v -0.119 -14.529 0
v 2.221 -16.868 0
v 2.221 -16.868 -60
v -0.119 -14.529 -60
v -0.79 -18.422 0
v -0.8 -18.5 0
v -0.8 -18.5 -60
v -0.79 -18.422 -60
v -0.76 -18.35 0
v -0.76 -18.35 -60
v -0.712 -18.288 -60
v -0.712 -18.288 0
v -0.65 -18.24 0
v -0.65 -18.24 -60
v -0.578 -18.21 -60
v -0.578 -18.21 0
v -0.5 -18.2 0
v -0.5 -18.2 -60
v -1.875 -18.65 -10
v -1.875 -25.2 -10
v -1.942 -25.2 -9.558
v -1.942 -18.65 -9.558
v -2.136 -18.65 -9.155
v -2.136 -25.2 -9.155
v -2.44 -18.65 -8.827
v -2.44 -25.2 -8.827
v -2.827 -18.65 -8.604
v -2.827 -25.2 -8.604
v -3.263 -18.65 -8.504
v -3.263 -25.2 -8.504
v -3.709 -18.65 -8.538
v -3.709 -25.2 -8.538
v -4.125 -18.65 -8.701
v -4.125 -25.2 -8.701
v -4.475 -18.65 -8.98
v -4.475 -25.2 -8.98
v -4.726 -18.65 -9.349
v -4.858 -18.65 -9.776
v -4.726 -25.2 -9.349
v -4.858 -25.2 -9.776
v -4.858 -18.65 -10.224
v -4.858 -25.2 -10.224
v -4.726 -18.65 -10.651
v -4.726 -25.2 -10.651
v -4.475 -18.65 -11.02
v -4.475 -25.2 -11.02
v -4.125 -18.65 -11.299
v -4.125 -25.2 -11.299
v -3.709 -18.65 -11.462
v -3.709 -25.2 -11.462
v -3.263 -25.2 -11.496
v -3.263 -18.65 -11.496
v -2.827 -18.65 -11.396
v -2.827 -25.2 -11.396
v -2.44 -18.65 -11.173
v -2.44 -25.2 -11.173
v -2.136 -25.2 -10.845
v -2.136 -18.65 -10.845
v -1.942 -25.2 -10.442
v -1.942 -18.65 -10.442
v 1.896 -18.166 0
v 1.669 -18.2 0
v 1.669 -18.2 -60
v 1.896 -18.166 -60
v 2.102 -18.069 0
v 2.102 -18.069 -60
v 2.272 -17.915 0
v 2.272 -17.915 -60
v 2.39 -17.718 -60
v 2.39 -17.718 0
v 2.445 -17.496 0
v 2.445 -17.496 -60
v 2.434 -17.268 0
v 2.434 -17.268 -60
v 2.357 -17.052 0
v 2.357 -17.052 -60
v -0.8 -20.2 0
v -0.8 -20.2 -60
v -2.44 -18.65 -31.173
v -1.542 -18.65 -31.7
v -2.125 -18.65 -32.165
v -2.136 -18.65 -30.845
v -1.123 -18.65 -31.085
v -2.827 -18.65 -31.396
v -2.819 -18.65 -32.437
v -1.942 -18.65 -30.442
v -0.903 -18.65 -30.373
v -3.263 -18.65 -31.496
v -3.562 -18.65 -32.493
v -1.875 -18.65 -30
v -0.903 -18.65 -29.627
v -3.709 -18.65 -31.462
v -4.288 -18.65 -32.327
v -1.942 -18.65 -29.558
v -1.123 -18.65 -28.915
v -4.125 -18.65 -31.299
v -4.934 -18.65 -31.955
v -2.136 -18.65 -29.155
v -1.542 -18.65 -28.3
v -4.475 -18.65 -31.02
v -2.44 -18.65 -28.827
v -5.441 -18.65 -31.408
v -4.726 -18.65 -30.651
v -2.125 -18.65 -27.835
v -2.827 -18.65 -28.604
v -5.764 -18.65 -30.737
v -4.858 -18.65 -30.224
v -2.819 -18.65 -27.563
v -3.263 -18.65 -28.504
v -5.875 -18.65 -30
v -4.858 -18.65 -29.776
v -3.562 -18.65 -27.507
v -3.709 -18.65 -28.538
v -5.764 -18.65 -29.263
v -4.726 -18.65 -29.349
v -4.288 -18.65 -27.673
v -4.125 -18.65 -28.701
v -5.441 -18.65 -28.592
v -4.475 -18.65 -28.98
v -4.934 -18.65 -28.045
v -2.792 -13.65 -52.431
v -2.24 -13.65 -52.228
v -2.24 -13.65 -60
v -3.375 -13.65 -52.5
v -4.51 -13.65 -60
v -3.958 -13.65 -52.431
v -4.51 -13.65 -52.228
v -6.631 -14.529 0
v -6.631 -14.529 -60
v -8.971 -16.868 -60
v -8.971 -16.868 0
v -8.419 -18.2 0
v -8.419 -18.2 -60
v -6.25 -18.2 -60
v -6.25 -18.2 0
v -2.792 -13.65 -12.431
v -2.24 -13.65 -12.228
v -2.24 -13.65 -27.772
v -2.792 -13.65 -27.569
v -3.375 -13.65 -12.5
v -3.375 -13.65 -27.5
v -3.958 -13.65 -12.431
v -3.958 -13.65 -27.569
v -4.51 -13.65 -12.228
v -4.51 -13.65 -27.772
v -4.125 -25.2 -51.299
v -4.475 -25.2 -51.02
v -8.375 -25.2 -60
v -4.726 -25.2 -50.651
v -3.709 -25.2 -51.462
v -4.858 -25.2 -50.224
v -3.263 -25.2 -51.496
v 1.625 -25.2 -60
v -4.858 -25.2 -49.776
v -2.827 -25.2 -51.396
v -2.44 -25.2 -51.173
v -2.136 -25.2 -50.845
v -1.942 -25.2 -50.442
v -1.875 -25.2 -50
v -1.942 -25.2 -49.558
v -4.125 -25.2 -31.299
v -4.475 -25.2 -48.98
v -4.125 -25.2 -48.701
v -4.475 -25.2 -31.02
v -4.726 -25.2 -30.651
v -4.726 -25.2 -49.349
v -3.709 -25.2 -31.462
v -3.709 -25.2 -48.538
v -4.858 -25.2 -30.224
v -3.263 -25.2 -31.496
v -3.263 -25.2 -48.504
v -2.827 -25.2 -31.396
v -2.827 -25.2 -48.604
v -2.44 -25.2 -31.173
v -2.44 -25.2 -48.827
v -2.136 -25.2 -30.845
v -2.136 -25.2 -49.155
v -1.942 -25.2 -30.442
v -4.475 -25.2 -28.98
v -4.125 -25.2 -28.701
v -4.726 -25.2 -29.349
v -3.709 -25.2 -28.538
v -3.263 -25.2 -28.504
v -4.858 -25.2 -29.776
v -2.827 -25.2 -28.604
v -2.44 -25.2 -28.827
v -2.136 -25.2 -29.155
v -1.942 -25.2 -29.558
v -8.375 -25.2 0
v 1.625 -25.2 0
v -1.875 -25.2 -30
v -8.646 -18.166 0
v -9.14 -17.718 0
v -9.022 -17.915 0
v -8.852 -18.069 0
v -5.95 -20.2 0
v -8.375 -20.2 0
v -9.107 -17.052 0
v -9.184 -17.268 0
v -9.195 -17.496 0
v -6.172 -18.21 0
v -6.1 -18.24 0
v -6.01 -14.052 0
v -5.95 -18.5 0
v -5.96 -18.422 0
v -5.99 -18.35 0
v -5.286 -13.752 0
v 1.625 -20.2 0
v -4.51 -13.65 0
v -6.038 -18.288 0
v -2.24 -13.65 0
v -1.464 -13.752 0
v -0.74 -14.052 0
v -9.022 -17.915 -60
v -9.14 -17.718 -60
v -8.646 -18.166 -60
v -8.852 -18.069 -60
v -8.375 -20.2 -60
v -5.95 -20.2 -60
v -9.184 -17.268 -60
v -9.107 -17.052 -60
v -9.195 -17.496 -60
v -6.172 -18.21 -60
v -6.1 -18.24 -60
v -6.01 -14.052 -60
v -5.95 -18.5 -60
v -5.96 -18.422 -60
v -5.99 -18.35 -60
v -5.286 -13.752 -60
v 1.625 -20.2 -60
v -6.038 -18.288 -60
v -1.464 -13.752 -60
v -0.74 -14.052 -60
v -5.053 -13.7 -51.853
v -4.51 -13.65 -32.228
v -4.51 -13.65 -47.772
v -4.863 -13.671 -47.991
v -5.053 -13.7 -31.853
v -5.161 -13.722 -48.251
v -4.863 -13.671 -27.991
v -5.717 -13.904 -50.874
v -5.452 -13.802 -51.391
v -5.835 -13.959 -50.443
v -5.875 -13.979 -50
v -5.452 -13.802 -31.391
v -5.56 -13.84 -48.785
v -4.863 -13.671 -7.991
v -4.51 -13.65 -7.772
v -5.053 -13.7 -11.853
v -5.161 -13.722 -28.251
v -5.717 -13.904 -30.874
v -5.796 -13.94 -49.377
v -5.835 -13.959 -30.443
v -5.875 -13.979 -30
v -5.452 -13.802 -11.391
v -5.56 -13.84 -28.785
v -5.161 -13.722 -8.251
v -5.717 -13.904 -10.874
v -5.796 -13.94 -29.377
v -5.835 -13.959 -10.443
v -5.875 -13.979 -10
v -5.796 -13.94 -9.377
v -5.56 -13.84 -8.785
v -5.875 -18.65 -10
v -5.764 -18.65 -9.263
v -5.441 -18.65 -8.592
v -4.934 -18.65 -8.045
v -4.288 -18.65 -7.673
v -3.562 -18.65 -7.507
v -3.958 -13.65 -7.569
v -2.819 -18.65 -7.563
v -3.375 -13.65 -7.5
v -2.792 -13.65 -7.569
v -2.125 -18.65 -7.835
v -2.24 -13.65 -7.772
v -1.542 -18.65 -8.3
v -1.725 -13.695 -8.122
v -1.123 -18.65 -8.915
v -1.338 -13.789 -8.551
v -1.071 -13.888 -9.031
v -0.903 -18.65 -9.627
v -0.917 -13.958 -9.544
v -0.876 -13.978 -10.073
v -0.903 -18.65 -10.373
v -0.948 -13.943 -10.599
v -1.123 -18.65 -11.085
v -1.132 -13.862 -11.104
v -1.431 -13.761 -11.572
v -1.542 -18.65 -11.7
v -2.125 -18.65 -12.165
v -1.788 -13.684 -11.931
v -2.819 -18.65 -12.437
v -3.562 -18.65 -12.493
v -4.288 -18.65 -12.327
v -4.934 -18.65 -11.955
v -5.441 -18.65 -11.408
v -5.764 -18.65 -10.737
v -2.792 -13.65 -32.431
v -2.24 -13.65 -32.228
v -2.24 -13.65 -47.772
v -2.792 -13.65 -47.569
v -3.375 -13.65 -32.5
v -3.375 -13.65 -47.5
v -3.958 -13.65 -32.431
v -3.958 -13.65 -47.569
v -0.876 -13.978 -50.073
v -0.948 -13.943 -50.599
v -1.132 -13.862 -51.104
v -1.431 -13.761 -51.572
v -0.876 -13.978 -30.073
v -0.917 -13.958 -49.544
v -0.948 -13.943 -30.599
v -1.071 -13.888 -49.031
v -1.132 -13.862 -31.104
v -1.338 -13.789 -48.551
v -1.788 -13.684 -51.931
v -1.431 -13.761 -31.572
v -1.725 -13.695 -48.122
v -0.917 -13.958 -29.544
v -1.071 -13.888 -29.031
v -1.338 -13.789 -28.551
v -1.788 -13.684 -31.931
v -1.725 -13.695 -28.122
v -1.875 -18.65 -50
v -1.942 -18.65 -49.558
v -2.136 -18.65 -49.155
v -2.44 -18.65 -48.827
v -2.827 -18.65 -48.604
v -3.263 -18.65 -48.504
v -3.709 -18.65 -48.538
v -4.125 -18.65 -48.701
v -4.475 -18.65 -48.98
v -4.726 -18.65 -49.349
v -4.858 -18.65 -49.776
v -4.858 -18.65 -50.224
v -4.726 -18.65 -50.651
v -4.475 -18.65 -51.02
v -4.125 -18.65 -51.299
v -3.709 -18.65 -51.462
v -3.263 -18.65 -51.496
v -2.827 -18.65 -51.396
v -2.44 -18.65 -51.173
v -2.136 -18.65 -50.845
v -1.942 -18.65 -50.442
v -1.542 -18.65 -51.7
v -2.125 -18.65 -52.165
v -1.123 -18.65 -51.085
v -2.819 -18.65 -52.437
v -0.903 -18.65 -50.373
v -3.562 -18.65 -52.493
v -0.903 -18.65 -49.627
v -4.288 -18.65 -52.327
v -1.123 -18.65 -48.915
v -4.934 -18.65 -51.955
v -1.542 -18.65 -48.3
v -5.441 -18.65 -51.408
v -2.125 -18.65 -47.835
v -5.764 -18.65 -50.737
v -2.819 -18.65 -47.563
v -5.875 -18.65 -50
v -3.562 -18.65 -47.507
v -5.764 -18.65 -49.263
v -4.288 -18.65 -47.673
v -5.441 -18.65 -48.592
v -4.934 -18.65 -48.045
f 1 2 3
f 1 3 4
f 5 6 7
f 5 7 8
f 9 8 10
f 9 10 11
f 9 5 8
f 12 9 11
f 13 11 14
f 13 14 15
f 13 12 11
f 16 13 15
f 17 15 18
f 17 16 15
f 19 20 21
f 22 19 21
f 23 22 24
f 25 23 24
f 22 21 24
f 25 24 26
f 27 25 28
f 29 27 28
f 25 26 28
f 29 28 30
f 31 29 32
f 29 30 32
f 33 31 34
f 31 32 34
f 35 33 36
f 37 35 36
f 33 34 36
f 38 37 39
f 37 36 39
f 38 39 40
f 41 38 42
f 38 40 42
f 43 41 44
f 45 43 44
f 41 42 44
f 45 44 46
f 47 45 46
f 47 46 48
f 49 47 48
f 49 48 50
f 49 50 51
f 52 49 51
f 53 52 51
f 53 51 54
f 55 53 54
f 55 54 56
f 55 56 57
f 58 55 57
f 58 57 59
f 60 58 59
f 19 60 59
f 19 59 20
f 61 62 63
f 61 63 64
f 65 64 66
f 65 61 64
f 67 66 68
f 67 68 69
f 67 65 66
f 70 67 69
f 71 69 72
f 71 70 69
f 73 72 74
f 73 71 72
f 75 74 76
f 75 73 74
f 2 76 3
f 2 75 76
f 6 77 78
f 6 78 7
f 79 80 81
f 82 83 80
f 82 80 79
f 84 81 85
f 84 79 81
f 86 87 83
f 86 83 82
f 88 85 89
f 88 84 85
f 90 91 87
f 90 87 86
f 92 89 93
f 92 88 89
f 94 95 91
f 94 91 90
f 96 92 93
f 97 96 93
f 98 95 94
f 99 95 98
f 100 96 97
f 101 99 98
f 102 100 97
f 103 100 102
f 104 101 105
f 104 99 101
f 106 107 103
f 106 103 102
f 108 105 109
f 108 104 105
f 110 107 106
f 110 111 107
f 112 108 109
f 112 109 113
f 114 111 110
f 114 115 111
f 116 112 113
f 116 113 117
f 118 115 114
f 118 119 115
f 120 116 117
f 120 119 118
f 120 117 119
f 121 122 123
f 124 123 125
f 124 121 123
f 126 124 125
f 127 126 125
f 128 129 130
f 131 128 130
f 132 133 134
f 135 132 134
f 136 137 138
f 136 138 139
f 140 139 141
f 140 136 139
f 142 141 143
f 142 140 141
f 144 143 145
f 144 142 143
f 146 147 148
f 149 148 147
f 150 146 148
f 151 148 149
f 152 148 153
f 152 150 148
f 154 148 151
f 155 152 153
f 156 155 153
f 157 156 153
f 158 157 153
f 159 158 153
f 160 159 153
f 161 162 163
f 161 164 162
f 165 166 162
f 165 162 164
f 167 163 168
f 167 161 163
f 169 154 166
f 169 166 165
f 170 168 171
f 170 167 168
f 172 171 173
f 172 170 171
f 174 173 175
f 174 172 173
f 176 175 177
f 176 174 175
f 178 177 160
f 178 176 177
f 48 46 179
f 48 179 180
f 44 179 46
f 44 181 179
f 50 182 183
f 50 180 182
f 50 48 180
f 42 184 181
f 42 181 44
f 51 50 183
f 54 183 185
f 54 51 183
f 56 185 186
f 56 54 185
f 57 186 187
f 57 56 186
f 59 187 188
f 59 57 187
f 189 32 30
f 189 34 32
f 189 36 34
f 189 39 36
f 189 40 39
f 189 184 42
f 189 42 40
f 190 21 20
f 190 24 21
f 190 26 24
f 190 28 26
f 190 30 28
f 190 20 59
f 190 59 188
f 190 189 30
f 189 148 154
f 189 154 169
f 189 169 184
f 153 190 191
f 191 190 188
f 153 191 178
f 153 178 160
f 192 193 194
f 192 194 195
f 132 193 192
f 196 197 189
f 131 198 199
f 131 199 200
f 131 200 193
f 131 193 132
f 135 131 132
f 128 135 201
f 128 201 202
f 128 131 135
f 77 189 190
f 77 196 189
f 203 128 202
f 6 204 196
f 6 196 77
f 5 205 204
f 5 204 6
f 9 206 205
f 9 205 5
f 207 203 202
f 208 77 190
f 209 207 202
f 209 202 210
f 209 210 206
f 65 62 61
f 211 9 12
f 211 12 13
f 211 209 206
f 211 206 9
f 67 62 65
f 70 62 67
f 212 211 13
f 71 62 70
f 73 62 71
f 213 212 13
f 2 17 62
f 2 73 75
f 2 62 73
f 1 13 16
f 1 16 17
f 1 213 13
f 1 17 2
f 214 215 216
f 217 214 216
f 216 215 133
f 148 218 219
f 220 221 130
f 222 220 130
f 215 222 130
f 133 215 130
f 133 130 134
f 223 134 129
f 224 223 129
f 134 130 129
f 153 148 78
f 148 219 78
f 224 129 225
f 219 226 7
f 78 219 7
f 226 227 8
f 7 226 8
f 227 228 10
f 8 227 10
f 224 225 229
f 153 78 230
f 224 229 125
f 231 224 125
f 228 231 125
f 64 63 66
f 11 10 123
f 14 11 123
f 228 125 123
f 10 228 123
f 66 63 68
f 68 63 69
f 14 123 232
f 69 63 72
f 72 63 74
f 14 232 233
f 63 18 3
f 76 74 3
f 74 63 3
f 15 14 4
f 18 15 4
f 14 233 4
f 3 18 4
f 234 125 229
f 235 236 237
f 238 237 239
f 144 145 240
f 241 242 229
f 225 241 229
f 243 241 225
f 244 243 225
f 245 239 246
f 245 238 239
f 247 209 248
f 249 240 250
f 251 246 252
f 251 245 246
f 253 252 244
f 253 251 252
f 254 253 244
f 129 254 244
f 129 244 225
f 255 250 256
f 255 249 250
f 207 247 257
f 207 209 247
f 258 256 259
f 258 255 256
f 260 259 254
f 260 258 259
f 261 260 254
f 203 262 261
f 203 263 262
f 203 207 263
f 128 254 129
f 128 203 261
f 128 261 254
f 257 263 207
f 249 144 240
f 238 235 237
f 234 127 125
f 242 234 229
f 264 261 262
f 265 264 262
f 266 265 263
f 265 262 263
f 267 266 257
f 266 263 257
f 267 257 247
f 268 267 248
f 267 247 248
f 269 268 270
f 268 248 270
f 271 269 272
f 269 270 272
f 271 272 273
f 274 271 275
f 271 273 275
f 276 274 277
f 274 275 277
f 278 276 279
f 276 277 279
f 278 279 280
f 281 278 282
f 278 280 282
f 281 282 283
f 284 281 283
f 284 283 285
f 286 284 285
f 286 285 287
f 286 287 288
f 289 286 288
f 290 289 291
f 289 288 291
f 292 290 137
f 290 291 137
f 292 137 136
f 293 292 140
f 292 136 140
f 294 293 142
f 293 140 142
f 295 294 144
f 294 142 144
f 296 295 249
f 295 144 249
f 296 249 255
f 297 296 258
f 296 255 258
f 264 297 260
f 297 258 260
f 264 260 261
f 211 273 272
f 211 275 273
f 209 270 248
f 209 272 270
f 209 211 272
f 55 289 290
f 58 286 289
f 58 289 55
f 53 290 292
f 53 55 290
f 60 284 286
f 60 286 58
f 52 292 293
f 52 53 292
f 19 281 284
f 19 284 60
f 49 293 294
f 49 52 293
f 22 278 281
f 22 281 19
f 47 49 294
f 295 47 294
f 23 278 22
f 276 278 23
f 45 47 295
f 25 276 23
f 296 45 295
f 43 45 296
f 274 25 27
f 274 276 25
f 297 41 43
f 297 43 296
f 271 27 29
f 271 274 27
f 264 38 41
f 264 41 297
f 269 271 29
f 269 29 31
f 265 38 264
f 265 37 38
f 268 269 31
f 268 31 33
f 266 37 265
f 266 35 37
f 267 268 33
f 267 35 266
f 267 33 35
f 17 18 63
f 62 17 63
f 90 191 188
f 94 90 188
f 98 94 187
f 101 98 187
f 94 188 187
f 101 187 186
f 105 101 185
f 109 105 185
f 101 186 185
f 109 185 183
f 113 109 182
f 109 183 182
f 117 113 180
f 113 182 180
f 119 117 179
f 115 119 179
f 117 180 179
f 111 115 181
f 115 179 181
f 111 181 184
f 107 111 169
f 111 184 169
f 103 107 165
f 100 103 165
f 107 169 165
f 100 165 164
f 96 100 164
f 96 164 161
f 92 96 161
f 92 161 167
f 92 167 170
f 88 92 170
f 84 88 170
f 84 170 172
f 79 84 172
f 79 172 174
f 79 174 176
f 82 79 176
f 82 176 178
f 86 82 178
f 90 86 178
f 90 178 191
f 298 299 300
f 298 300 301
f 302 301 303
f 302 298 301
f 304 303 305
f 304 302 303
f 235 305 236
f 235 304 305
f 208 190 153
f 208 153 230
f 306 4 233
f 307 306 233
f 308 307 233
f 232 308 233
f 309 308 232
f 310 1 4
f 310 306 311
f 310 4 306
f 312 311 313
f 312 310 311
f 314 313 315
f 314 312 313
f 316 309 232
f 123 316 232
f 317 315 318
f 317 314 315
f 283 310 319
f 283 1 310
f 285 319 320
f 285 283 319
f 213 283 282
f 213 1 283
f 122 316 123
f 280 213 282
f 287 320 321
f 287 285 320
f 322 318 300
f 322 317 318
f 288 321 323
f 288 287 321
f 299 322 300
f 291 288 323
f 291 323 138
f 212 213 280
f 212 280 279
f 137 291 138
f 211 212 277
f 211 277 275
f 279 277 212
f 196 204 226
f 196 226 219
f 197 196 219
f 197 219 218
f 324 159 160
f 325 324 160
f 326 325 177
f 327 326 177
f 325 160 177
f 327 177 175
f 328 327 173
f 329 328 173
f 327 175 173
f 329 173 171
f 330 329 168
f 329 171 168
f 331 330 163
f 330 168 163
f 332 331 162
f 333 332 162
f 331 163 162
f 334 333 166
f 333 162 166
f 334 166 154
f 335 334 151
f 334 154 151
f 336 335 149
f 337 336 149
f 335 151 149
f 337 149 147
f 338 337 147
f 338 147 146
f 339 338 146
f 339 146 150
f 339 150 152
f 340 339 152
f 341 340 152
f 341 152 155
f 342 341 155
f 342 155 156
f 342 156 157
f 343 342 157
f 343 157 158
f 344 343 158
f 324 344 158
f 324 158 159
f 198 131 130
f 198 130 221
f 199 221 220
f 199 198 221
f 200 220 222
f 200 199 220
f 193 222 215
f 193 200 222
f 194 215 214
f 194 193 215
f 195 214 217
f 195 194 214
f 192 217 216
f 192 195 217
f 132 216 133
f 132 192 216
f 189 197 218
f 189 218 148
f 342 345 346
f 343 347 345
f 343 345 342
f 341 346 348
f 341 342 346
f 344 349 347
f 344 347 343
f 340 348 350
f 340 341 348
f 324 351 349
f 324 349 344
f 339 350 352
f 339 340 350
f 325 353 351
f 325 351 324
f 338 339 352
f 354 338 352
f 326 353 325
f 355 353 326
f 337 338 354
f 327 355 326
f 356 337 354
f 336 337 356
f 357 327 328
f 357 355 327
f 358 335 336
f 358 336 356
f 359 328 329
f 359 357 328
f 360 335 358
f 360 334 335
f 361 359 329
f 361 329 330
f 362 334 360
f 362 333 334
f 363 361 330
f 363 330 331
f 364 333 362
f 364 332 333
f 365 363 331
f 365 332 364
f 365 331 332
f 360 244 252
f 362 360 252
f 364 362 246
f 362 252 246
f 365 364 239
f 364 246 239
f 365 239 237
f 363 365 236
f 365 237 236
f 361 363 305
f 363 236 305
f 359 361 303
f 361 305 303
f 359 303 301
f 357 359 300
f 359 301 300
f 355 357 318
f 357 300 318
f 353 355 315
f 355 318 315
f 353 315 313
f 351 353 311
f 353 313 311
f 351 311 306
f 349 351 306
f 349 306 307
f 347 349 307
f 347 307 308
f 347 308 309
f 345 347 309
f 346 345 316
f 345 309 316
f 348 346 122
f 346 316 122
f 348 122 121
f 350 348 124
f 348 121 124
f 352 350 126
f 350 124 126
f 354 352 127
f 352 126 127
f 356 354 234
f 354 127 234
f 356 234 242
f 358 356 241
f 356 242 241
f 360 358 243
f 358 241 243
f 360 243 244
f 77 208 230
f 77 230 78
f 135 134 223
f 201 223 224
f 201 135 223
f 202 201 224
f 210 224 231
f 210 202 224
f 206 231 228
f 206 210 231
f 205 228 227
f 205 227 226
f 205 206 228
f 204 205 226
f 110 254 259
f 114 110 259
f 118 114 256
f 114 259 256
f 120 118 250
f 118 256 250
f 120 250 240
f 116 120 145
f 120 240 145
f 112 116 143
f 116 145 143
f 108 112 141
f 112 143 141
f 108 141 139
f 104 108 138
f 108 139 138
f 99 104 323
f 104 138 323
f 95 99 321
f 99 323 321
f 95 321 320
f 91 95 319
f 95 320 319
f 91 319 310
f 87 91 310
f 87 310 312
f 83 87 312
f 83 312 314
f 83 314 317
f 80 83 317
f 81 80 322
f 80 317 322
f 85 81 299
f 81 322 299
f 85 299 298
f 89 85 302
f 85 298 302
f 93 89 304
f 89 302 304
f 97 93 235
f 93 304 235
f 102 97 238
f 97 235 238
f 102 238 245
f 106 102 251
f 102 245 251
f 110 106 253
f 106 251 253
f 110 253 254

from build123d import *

# Parameters (mm, degrees)
F1_DEPTH = 60
F2_R     = 1.5
F3_DEPTH = 25
F4_R     = 2.5
F5_R     = 2.5
F6_DEPTH = 5


with BuildPart() as f1:
    # F0 (on Top) → F1 (new body)
    with BuildSketch(Plane.XY):
        with BuildLine():
            Line((-0.8, -20.2), (-0.8, -19.2))
            Line((-0.8, -19.2), (-0.8, -18.500001))
            ThreePointArc((-0.8, -18.500001), (-0.712132, -18.287869), (-0.5, -18.200001))
            Line((-0.5, -18.200001), (1.669121, -18.2))
            ThreePointArc((1.669121, -18.2), (2.389747, -17.718493), (2.220664, -16.868457))
            Line((2.220664, -16.868457), (-0.119113, -14.52868))
            ThreePointArc((-0.119113, -14.52868), (-1.092383, -13.878361), (-2.240433, -13.65))
            Line((-2.240433, -13.65), (-4.509567, -13.65))
            ThreePointArc((-4.509567, -13.65), (-5.657617, -13.878361), (-6.630887, -14.52868))
            Line((-6.630887, -14.52868), (-8.970664, -16.868457))
            ThreePointArc((-8.970664, -16.868457), (-9.139747, -17.718493), (-8.419121, -18.2))
            Line((-8.419121, -18.2), (-6.25, -18.200001))
            ThreePointArc((-6.25, -18.200001), (-6.037868, -18.287869), (-5.95, -18.500001))
            Line((-5.95, -18.500001), (-5.95, -19.2))
            Line((-5.95, -19.2), (-5.95, -20.2))
            Line((-5.95, -20.2), (-8.375, -20.2))
            Line((-8.375, -20.2), (-8.375, -25.2))
            Line((-8.375, -25.2), (-3.375, -25.2))
            Line((-3.375, -25.2), (1.625, -25.2))
            Line((1.625, -25.2), (1.625, -20.2))
            Line((1.625, -20.2), (-0.8, -20.2))
        make_face()
    extrude(amount=-F1_DEPTH)

    # F2 (on face) → F3 (cut)
    with BuildSketch(Plane.XZ.offset(25.2)):
        with Locations((-3.375, -50)):
            Circle(F2_R)
        with Locations((-3.375, -30)):
            Circle(F2_R)
        with Locations((-3.375, -10)):
            Circle(F2_R)
    extrude(amount=-F3_DEPTH, mode=Mode.SUBTRACT)

    # F4 (on face) + F5 (on face) → F6 (cut)
    with BuildSketch(Plane(origin=(0, -13.65, 0), x_dir=(-1, 0, 0), z_dir=(0, 1, 0))):
        with Locations((3.375, -10)):
            Circle(F4_R)
        with Locations((3.375, -30)):
            Circle(F4_R)
    with BuildSketch(Plane(origin=(0, -13.65, 0), x_dir=(-1, 0, 0), z_dir=(0, 1, 0))):
        with Locations((3.375, -50)):
            Circle(F5_R)
    extrude(amount=-F6_DEPTH, mode=Mode.SUBTRACT)


solid = f1.part
